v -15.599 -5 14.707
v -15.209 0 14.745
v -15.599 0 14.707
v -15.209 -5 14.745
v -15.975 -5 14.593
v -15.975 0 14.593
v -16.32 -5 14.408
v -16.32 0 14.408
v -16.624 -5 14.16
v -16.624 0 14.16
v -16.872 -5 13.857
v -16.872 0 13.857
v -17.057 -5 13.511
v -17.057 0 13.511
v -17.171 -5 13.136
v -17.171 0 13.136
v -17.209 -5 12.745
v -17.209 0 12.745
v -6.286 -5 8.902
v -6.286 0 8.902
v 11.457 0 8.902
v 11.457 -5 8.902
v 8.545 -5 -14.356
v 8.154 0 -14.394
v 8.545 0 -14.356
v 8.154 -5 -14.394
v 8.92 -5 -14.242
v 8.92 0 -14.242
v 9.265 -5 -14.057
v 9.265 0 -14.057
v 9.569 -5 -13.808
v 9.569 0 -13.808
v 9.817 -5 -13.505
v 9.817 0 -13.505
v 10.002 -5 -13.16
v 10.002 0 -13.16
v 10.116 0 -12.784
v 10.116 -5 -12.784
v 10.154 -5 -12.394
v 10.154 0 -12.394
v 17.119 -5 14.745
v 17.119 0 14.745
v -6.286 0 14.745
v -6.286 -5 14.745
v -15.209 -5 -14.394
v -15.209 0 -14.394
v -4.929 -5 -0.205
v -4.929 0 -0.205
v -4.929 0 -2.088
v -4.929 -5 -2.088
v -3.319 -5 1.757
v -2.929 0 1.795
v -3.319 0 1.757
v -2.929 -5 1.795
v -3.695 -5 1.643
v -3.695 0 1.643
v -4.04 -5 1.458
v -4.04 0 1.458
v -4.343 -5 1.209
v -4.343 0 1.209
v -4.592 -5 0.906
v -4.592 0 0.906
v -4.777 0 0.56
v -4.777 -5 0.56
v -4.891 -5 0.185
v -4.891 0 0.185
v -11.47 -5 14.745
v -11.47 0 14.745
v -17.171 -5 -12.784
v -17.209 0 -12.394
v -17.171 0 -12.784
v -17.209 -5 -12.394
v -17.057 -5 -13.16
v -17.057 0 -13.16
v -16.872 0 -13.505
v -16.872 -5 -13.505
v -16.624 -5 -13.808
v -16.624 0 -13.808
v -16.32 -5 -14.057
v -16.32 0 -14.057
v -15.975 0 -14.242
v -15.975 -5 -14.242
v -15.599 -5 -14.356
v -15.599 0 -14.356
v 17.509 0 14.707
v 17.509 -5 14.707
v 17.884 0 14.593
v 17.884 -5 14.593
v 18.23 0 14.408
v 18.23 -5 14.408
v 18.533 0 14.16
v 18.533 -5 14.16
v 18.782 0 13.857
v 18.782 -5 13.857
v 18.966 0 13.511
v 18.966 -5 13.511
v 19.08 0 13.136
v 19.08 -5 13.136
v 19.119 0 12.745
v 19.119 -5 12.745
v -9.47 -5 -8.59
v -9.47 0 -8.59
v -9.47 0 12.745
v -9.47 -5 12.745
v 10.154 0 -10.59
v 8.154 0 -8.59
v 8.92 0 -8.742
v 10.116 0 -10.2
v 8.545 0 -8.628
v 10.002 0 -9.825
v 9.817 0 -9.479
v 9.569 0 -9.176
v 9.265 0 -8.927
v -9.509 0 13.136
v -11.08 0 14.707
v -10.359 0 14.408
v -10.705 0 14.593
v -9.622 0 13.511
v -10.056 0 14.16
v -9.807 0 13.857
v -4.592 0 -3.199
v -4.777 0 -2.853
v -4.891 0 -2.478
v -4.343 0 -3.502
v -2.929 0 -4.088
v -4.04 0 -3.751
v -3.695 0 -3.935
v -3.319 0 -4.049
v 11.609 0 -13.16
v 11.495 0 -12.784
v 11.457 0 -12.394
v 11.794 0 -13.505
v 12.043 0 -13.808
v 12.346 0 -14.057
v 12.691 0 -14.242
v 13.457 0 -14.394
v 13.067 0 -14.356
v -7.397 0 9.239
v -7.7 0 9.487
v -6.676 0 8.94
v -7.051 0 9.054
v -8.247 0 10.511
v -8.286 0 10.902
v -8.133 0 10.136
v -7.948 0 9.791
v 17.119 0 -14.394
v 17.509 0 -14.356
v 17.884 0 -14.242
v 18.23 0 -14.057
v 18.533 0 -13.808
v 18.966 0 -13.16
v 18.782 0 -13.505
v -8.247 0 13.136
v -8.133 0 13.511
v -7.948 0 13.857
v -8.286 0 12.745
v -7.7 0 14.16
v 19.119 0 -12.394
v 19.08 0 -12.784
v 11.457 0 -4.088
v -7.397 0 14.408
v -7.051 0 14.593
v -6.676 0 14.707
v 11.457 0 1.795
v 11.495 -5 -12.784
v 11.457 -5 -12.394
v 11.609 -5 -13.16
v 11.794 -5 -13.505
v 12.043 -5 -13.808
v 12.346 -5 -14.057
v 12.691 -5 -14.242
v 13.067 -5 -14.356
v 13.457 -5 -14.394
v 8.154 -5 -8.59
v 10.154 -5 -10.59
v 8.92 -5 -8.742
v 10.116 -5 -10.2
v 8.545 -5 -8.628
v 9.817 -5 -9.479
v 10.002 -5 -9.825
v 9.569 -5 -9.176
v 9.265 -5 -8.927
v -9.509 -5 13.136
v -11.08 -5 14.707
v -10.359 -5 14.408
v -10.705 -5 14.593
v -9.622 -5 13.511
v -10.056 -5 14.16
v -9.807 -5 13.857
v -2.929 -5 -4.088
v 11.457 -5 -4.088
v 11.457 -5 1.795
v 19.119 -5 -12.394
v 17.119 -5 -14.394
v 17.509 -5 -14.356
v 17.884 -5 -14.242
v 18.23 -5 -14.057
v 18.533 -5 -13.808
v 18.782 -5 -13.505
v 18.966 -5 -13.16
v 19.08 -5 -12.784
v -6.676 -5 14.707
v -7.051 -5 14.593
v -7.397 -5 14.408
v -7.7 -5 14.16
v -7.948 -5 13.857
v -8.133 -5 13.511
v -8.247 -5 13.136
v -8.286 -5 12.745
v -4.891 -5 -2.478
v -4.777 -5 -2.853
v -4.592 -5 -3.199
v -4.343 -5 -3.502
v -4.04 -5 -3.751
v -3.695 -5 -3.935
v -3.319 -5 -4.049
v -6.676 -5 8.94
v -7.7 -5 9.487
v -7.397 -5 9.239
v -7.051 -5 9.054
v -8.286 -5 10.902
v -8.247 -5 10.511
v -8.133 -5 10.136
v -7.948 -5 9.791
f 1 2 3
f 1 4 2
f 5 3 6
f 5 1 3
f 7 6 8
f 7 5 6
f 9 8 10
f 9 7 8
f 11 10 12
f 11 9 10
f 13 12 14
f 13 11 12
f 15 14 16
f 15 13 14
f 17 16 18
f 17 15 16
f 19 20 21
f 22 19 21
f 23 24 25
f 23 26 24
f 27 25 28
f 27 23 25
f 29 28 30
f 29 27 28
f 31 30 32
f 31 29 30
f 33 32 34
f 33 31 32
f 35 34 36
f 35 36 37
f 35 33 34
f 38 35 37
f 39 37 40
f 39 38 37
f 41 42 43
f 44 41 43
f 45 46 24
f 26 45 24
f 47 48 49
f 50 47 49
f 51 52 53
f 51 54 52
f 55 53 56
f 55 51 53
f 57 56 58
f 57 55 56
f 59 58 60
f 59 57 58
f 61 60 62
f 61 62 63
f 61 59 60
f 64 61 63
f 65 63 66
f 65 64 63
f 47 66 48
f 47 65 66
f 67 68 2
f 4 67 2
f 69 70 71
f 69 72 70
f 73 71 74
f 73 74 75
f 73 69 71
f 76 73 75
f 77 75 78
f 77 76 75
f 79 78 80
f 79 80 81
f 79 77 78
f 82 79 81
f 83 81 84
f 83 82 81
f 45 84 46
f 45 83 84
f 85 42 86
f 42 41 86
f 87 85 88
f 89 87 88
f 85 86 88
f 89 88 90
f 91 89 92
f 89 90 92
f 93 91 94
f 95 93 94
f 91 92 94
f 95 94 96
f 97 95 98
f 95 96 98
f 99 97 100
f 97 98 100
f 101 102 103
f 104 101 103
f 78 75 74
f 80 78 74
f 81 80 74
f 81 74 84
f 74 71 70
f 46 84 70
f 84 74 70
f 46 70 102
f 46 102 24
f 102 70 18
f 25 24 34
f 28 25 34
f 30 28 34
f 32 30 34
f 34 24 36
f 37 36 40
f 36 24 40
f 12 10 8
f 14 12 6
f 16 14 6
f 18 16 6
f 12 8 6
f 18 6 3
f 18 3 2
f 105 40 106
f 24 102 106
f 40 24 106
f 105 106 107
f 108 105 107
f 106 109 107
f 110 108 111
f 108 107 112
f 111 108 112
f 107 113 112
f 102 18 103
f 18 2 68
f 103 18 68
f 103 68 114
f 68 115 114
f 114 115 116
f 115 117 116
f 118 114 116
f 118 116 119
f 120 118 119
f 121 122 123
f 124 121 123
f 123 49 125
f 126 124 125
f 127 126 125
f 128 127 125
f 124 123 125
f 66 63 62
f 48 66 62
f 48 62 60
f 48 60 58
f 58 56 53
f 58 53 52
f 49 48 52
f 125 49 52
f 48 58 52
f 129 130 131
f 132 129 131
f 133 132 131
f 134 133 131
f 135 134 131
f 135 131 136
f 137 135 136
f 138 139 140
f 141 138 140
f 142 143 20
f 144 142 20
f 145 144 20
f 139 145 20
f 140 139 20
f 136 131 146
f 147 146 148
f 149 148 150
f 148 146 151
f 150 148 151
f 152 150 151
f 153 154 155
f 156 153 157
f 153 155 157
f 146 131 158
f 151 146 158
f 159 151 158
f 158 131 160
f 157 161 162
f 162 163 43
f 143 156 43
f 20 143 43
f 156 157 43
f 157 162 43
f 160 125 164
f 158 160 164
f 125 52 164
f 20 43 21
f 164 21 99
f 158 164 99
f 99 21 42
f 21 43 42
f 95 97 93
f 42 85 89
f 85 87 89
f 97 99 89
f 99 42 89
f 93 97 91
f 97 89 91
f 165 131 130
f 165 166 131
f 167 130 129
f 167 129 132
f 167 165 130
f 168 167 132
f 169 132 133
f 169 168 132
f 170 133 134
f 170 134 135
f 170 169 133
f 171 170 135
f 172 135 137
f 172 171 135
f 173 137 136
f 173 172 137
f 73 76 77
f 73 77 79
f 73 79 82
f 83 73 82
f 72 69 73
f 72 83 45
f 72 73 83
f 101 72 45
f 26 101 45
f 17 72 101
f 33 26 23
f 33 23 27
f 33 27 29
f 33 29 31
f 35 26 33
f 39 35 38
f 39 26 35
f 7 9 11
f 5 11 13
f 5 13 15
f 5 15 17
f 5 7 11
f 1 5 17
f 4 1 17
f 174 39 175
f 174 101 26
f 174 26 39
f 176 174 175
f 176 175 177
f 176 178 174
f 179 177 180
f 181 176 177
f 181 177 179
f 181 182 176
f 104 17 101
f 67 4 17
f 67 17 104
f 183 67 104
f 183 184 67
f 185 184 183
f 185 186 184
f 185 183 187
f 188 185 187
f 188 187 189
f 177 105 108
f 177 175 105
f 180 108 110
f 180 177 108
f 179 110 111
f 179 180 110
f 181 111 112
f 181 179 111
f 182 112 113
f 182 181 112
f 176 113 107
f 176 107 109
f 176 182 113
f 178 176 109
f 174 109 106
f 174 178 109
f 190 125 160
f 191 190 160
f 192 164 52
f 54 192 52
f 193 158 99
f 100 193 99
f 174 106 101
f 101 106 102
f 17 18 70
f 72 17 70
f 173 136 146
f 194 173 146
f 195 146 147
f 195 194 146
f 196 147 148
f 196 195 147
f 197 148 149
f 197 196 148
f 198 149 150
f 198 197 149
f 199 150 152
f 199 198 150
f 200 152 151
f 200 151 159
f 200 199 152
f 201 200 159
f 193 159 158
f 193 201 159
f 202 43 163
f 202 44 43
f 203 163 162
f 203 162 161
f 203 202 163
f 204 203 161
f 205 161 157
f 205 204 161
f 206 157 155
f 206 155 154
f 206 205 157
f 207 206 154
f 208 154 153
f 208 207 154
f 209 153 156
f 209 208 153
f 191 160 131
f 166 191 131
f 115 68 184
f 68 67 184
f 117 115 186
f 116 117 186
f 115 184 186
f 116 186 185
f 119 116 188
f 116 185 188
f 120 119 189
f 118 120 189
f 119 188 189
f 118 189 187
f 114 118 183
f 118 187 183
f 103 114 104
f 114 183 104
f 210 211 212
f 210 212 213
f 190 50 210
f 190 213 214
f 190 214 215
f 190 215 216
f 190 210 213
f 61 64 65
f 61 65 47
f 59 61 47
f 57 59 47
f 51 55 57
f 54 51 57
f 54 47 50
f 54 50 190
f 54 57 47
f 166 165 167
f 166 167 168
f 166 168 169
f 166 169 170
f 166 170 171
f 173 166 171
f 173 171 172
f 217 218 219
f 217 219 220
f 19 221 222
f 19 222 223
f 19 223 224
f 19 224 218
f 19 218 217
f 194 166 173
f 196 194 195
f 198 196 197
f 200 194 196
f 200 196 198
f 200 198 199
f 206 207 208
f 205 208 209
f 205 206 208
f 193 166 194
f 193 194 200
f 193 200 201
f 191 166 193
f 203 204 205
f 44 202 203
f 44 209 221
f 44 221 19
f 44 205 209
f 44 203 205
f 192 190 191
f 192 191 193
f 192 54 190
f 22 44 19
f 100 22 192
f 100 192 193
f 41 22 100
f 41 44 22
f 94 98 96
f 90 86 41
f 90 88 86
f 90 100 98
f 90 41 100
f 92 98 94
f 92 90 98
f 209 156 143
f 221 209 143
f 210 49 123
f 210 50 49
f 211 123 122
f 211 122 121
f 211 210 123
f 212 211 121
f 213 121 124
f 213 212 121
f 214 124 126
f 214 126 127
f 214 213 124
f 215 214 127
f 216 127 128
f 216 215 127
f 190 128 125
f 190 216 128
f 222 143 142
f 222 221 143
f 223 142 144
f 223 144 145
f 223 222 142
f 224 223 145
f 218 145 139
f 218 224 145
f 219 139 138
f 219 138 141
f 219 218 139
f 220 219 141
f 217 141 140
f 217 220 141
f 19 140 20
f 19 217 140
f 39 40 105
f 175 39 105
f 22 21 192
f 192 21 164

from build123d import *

# Parameters (mm, degrees)
F1_DEPTH = 5
F2_R     = 2


with BuildPart() as f1:
    # F0 (on Front) → F1 (new body)
    with BuildSketch(Plane.XZ):
        Polygon((-9.470089, 14.745392), (-17.209295, 14.745392), (-17.209295, -14.394257), (10.154326, -14.394257), (10.154326, -8.590018), (-9.470089, -8.590018), align=None)
        Polygon((19.118614, 14.745392), (-8.285517, 14.745392), (-8.285517, 8.901669), (11.456843, 8.901669), (11.456843, 1.795119), (-4.929229, 1.795119), (-4.929229, -4.08758), (11.456843, -4.08758), (11.456843, -14.394257), (19.118614, -14.394257), align=None)
    extrude(amount=F1_DEPTH)

    # F2
    f2_edges = [f1.edges().sort_by_distance(p)[0] for p in [
        (-17.209295, -2.5, 14.745392),
        (-9.470089, -2.5, 14.745392),
        (-17.209295, -2.5, -14.394257),
        (10.154326, -2.5, -14.394257),
        (10.154326, -2.5, -8.590018),
        (11.456843, -2.5, -14.394257),
        (19.118614, -2.5, -14.394257),
        (19.118614, -2.5, 14.745392),
        (-4.929229, -2.5, -4.08758),
        (-4.929229, -2.5, 1.795119),
        (-8.285517, -2.5, 8.901669),
        (-8.285517, -2.5, 14.745392),
    ]]
    fillet(f2_edges, radius=F2_R)


solid = f1.part
